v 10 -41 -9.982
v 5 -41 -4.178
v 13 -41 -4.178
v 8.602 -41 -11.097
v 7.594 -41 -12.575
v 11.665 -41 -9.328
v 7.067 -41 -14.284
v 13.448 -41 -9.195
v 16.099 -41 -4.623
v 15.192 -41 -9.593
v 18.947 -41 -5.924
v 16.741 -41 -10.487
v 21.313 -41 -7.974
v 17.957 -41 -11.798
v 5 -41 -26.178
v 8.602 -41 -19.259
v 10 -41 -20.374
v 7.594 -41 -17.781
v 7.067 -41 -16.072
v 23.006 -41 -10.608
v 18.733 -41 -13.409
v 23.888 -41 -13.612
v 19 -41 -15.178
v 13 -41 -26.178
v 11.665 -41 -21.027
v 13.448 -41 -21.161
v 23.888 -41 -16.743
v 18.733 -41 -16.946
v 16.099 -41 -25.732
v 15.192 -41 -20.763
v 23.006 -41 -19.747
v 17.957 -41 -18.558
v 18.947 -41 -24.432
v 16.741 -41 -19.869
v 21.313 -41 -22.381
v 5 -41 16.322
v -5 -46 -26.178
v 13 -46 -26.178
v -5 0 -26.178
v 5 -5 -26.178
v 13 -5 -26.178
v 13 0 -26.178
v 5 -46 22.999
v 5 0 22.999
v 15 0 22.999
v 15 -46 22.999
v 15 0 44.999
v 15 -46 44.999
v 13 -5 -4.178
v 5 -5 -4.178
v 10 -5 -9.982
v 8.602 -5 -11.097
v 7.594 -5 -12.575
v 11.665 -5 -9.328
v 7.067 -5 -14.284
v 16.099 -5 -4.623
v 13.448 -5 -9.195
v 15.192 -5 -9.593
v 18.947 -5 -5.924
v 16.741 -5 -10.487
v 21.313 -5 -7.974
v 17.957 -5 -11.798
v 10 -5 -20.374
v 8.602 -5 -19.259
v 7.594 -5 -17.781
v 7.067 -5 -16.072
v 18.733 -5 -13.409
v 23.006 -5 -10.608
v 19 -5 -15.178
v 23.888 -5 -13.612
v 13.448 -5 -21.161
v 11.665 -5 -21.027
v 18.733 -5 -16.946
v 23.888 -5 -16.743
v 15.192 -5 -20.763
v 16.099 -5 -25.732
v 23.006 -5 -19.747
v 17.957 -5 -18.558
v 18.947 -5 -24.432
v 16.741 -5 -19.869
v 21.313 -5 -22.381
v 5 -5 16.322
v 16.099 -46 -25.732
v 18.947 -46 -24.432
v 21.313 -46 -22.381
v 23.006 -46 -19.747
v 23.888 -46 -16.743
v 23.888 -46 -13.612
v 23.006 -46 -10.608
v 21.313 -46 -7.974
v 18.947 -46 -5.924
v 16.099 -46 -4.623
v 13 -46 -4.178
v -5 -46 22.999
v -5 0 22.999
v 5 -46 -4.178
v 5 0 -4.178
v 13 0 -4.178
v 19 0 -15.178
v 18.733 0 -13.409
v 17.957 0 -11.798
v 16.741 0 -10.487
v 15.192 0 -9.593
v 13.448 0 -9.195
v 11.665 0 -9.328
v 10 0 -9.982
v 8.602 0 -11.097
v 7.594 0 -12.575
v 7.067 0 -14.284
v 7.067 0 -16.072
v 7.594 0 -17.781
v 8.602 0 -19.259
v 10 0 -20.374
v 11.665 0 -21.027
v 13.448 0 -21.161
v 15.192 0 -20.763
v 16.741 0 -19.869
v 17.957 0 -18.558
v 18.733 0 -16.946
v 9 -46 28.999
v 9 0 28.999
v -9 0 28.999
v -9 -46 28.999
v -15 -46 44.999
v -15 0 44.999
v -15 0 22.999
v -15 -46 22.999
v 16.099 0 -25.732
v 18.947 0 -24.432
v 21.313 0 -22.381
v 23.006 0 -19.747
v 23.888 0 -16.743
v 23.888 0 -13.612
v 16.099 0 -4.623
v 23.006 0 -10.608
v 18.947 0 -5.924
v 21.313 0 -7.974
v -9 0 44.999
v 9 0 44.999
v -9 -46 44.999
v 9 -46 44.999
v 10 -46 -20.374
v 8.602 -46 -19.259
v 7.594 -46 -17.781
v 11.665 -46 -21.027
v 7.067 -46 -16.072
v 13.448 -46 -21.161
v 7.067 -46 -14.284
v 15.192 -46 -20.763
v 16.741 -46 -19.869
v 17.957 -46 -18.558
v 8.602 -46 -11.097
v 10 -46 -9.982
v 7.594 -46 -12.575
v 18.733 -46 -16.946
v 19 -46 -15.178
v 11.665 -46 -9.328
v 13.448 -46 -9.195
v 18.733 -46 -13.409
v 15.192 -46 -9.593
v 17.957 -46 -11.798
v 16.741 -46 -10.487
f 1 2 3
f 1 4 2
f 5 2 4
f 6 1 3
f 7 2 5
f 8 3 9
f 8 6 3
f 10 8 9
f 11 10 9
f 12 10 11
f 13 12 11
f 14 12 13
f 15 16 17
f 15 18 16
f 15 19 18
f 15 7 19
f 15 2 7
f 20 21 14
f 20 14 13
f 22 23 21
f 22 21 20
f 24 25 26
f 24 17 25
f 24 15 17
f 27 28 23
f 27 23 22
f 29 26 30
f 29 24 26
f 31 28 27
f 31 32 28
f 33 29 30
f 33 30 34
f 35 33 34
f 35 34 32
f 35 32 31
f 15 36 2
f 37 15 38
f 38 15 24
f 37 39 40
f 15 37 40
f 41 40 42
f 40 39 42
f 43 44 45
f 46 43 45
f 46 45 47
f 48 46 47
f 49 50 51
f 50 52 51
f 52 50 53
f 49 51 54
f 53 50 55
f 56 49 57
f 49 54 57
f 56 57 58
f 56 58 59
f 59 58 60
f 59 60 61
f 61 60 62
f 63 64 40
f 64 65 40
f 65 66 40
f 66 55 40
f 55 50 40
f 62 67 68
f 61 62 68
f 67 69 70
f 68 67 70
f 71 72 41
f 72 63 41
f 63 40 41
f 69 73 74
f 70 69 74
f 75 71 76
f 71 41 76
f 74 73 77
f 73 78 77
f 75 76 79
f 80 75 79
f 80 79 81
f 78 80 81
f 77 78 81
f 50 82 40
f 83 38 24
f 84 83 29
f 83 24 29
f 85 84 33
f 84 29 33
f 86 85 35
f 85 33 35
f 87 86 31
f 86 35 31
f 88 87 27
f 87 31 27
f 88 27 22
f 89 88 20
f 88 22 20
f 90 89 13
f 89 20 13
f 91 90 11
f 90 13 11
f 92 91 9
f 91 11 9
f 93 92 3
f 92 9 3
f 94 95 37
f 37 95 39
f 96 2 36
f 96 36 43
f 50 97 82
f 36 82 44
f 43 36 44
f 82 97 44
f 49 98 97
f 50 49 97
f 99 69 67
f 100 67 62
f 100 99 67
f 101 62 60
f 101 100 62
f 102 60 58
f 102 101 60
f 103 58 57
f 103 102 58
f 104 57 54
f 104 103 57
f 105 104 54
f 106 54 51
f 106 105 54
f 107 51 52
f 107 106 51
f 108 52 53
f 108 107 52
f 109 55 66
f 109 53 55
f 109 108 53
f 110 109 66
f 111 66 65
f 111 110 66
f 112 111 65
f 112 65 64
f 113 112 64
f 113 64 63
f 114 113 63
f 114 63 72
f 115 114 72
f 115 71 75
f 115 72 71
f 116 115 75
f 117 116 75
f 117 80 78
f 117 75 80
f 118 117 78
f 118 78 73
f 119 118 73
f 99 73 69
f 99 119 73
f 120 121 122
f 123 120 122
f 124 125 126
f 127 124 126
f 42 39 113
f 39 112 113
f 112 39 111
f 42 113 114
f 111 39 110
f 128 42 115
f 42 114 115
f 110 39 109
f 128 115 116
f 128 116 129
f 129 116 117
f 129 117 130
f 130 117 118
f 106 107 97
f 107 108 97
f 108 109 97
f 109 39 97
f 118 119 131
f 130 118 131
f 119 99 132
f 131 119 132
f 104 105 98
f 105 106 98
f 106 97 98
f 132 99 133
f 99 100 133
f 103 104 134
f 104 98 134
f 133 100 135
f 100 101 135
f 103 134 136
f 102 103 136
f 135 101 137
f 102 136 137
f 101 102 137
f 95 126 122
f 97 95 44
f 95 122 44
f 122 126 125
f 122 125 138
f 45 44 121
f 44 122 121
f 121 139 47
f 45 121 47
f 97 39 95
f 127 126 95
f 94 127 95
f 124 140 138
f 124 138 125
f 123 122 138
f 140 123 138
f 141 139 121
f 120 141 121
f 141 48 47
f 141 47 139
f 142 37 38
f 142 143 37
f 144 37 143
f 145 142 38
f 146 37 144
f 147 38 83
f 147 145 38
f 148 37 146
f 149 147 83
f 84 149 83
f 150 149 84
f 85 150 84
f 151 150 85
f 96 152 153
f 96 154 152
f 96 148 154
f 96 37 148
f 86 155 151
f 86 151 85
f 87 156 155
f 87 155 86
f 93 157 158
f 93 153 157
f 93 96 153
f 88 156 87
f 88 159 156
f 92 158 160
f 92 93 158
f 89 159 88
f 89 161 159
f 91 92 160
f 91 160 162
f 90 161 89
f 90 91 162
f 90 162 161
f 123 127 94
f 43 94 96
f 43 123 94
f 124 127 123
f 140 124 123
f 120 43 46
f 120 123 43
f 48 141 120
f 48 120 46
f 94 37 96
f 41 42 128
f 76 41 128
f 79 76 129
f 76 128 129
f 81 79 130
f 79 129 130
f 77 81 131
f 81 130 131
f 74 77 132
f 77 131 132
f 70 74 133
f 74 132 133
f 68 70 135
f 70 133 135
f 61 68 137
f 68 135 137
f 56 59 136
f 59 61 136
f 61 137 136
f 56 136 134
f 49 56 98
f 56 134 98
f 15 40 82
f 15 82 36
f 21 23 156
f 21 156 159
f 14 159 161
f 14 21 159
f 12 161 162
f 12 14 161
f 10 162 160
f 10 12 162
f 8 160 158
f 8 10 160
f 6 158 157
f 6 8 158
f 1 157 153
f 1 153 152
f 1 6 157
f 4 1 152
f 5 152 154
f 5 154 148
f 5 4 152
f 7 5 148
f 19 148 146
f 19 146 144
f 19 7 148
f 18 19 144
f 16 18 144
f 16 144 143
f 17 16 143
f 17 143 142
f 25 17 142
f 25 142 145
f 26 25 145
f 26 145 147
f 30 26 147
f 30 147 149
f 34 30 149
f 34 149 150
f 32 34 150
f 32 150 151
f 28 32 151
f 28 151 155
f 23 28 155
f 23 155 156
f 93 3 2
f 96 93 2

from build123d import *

# Parameters (mm, degrees)
F0_R     = 6
F1_DEPTH = 46
F2_W     = 26.921937
F2_H     = 36
F3_DEPTH = 42.5


with BuildPart() as f1:
    # F0 (on Front) → F1 (new body)
    with BuildSketch(Plane.XZ):
        with BuildLine():
            Line((-9, 44.998586), (-15, 44.998586))
            Line((-15, 44.998586), (-15, 22.998586))
            Line((-15, 22.998586), (-5, 22.998586))
            Line((-5, 22.998586), (-5, -26.177896))
            Line((-5, -26.177896), (5, -26.177896))
            Line((5, -26.177896), (13, -26.177896))
            ThreePointArc((13, -26.177896), (24, -15.177896), (13, -4.177896))
            Line((13, -4.177896), (5, -4.177896))
            Line((5, -4.177896), (5, 22.998586))
            Line((5, 22.998586), (15, 22.998586))
            Line((15, 22.998586), (15, 44.998586))
            Line((15, 44.998586), (9, 44.998586))
            Line((9, 44.998586), (9, 28.998586))
            Line((9, 28.998586), (-9, 28.998586))
            Line((-9, 28.998586), (-9, 44.998586))
        make_face()
        with Locations((13, -15.177896)):
            Circle(F0_R, mode=Mode.SUBTRACT)
    extrude(amount=F1_DEPTH)


with BuildPart() as f3:
    # F2 (on face) → F3 (new body)
    with BuildSketch(Plane(origin=(0, 0, -26.177896), x_dir=(1, 0, 0), z_dir=(0, 0, -1))):
        with Locations((18.460968, 23)):
            Rectangle(F2_W, F2_H)
    extrude(amount=-F3_DEPTH)


with BuildPart() as f1_1:
    add(f1.part)

    # F4: cut F3
    add(f3.part, mode=Mode.SUBTRACT)


solid = f1_1.part
